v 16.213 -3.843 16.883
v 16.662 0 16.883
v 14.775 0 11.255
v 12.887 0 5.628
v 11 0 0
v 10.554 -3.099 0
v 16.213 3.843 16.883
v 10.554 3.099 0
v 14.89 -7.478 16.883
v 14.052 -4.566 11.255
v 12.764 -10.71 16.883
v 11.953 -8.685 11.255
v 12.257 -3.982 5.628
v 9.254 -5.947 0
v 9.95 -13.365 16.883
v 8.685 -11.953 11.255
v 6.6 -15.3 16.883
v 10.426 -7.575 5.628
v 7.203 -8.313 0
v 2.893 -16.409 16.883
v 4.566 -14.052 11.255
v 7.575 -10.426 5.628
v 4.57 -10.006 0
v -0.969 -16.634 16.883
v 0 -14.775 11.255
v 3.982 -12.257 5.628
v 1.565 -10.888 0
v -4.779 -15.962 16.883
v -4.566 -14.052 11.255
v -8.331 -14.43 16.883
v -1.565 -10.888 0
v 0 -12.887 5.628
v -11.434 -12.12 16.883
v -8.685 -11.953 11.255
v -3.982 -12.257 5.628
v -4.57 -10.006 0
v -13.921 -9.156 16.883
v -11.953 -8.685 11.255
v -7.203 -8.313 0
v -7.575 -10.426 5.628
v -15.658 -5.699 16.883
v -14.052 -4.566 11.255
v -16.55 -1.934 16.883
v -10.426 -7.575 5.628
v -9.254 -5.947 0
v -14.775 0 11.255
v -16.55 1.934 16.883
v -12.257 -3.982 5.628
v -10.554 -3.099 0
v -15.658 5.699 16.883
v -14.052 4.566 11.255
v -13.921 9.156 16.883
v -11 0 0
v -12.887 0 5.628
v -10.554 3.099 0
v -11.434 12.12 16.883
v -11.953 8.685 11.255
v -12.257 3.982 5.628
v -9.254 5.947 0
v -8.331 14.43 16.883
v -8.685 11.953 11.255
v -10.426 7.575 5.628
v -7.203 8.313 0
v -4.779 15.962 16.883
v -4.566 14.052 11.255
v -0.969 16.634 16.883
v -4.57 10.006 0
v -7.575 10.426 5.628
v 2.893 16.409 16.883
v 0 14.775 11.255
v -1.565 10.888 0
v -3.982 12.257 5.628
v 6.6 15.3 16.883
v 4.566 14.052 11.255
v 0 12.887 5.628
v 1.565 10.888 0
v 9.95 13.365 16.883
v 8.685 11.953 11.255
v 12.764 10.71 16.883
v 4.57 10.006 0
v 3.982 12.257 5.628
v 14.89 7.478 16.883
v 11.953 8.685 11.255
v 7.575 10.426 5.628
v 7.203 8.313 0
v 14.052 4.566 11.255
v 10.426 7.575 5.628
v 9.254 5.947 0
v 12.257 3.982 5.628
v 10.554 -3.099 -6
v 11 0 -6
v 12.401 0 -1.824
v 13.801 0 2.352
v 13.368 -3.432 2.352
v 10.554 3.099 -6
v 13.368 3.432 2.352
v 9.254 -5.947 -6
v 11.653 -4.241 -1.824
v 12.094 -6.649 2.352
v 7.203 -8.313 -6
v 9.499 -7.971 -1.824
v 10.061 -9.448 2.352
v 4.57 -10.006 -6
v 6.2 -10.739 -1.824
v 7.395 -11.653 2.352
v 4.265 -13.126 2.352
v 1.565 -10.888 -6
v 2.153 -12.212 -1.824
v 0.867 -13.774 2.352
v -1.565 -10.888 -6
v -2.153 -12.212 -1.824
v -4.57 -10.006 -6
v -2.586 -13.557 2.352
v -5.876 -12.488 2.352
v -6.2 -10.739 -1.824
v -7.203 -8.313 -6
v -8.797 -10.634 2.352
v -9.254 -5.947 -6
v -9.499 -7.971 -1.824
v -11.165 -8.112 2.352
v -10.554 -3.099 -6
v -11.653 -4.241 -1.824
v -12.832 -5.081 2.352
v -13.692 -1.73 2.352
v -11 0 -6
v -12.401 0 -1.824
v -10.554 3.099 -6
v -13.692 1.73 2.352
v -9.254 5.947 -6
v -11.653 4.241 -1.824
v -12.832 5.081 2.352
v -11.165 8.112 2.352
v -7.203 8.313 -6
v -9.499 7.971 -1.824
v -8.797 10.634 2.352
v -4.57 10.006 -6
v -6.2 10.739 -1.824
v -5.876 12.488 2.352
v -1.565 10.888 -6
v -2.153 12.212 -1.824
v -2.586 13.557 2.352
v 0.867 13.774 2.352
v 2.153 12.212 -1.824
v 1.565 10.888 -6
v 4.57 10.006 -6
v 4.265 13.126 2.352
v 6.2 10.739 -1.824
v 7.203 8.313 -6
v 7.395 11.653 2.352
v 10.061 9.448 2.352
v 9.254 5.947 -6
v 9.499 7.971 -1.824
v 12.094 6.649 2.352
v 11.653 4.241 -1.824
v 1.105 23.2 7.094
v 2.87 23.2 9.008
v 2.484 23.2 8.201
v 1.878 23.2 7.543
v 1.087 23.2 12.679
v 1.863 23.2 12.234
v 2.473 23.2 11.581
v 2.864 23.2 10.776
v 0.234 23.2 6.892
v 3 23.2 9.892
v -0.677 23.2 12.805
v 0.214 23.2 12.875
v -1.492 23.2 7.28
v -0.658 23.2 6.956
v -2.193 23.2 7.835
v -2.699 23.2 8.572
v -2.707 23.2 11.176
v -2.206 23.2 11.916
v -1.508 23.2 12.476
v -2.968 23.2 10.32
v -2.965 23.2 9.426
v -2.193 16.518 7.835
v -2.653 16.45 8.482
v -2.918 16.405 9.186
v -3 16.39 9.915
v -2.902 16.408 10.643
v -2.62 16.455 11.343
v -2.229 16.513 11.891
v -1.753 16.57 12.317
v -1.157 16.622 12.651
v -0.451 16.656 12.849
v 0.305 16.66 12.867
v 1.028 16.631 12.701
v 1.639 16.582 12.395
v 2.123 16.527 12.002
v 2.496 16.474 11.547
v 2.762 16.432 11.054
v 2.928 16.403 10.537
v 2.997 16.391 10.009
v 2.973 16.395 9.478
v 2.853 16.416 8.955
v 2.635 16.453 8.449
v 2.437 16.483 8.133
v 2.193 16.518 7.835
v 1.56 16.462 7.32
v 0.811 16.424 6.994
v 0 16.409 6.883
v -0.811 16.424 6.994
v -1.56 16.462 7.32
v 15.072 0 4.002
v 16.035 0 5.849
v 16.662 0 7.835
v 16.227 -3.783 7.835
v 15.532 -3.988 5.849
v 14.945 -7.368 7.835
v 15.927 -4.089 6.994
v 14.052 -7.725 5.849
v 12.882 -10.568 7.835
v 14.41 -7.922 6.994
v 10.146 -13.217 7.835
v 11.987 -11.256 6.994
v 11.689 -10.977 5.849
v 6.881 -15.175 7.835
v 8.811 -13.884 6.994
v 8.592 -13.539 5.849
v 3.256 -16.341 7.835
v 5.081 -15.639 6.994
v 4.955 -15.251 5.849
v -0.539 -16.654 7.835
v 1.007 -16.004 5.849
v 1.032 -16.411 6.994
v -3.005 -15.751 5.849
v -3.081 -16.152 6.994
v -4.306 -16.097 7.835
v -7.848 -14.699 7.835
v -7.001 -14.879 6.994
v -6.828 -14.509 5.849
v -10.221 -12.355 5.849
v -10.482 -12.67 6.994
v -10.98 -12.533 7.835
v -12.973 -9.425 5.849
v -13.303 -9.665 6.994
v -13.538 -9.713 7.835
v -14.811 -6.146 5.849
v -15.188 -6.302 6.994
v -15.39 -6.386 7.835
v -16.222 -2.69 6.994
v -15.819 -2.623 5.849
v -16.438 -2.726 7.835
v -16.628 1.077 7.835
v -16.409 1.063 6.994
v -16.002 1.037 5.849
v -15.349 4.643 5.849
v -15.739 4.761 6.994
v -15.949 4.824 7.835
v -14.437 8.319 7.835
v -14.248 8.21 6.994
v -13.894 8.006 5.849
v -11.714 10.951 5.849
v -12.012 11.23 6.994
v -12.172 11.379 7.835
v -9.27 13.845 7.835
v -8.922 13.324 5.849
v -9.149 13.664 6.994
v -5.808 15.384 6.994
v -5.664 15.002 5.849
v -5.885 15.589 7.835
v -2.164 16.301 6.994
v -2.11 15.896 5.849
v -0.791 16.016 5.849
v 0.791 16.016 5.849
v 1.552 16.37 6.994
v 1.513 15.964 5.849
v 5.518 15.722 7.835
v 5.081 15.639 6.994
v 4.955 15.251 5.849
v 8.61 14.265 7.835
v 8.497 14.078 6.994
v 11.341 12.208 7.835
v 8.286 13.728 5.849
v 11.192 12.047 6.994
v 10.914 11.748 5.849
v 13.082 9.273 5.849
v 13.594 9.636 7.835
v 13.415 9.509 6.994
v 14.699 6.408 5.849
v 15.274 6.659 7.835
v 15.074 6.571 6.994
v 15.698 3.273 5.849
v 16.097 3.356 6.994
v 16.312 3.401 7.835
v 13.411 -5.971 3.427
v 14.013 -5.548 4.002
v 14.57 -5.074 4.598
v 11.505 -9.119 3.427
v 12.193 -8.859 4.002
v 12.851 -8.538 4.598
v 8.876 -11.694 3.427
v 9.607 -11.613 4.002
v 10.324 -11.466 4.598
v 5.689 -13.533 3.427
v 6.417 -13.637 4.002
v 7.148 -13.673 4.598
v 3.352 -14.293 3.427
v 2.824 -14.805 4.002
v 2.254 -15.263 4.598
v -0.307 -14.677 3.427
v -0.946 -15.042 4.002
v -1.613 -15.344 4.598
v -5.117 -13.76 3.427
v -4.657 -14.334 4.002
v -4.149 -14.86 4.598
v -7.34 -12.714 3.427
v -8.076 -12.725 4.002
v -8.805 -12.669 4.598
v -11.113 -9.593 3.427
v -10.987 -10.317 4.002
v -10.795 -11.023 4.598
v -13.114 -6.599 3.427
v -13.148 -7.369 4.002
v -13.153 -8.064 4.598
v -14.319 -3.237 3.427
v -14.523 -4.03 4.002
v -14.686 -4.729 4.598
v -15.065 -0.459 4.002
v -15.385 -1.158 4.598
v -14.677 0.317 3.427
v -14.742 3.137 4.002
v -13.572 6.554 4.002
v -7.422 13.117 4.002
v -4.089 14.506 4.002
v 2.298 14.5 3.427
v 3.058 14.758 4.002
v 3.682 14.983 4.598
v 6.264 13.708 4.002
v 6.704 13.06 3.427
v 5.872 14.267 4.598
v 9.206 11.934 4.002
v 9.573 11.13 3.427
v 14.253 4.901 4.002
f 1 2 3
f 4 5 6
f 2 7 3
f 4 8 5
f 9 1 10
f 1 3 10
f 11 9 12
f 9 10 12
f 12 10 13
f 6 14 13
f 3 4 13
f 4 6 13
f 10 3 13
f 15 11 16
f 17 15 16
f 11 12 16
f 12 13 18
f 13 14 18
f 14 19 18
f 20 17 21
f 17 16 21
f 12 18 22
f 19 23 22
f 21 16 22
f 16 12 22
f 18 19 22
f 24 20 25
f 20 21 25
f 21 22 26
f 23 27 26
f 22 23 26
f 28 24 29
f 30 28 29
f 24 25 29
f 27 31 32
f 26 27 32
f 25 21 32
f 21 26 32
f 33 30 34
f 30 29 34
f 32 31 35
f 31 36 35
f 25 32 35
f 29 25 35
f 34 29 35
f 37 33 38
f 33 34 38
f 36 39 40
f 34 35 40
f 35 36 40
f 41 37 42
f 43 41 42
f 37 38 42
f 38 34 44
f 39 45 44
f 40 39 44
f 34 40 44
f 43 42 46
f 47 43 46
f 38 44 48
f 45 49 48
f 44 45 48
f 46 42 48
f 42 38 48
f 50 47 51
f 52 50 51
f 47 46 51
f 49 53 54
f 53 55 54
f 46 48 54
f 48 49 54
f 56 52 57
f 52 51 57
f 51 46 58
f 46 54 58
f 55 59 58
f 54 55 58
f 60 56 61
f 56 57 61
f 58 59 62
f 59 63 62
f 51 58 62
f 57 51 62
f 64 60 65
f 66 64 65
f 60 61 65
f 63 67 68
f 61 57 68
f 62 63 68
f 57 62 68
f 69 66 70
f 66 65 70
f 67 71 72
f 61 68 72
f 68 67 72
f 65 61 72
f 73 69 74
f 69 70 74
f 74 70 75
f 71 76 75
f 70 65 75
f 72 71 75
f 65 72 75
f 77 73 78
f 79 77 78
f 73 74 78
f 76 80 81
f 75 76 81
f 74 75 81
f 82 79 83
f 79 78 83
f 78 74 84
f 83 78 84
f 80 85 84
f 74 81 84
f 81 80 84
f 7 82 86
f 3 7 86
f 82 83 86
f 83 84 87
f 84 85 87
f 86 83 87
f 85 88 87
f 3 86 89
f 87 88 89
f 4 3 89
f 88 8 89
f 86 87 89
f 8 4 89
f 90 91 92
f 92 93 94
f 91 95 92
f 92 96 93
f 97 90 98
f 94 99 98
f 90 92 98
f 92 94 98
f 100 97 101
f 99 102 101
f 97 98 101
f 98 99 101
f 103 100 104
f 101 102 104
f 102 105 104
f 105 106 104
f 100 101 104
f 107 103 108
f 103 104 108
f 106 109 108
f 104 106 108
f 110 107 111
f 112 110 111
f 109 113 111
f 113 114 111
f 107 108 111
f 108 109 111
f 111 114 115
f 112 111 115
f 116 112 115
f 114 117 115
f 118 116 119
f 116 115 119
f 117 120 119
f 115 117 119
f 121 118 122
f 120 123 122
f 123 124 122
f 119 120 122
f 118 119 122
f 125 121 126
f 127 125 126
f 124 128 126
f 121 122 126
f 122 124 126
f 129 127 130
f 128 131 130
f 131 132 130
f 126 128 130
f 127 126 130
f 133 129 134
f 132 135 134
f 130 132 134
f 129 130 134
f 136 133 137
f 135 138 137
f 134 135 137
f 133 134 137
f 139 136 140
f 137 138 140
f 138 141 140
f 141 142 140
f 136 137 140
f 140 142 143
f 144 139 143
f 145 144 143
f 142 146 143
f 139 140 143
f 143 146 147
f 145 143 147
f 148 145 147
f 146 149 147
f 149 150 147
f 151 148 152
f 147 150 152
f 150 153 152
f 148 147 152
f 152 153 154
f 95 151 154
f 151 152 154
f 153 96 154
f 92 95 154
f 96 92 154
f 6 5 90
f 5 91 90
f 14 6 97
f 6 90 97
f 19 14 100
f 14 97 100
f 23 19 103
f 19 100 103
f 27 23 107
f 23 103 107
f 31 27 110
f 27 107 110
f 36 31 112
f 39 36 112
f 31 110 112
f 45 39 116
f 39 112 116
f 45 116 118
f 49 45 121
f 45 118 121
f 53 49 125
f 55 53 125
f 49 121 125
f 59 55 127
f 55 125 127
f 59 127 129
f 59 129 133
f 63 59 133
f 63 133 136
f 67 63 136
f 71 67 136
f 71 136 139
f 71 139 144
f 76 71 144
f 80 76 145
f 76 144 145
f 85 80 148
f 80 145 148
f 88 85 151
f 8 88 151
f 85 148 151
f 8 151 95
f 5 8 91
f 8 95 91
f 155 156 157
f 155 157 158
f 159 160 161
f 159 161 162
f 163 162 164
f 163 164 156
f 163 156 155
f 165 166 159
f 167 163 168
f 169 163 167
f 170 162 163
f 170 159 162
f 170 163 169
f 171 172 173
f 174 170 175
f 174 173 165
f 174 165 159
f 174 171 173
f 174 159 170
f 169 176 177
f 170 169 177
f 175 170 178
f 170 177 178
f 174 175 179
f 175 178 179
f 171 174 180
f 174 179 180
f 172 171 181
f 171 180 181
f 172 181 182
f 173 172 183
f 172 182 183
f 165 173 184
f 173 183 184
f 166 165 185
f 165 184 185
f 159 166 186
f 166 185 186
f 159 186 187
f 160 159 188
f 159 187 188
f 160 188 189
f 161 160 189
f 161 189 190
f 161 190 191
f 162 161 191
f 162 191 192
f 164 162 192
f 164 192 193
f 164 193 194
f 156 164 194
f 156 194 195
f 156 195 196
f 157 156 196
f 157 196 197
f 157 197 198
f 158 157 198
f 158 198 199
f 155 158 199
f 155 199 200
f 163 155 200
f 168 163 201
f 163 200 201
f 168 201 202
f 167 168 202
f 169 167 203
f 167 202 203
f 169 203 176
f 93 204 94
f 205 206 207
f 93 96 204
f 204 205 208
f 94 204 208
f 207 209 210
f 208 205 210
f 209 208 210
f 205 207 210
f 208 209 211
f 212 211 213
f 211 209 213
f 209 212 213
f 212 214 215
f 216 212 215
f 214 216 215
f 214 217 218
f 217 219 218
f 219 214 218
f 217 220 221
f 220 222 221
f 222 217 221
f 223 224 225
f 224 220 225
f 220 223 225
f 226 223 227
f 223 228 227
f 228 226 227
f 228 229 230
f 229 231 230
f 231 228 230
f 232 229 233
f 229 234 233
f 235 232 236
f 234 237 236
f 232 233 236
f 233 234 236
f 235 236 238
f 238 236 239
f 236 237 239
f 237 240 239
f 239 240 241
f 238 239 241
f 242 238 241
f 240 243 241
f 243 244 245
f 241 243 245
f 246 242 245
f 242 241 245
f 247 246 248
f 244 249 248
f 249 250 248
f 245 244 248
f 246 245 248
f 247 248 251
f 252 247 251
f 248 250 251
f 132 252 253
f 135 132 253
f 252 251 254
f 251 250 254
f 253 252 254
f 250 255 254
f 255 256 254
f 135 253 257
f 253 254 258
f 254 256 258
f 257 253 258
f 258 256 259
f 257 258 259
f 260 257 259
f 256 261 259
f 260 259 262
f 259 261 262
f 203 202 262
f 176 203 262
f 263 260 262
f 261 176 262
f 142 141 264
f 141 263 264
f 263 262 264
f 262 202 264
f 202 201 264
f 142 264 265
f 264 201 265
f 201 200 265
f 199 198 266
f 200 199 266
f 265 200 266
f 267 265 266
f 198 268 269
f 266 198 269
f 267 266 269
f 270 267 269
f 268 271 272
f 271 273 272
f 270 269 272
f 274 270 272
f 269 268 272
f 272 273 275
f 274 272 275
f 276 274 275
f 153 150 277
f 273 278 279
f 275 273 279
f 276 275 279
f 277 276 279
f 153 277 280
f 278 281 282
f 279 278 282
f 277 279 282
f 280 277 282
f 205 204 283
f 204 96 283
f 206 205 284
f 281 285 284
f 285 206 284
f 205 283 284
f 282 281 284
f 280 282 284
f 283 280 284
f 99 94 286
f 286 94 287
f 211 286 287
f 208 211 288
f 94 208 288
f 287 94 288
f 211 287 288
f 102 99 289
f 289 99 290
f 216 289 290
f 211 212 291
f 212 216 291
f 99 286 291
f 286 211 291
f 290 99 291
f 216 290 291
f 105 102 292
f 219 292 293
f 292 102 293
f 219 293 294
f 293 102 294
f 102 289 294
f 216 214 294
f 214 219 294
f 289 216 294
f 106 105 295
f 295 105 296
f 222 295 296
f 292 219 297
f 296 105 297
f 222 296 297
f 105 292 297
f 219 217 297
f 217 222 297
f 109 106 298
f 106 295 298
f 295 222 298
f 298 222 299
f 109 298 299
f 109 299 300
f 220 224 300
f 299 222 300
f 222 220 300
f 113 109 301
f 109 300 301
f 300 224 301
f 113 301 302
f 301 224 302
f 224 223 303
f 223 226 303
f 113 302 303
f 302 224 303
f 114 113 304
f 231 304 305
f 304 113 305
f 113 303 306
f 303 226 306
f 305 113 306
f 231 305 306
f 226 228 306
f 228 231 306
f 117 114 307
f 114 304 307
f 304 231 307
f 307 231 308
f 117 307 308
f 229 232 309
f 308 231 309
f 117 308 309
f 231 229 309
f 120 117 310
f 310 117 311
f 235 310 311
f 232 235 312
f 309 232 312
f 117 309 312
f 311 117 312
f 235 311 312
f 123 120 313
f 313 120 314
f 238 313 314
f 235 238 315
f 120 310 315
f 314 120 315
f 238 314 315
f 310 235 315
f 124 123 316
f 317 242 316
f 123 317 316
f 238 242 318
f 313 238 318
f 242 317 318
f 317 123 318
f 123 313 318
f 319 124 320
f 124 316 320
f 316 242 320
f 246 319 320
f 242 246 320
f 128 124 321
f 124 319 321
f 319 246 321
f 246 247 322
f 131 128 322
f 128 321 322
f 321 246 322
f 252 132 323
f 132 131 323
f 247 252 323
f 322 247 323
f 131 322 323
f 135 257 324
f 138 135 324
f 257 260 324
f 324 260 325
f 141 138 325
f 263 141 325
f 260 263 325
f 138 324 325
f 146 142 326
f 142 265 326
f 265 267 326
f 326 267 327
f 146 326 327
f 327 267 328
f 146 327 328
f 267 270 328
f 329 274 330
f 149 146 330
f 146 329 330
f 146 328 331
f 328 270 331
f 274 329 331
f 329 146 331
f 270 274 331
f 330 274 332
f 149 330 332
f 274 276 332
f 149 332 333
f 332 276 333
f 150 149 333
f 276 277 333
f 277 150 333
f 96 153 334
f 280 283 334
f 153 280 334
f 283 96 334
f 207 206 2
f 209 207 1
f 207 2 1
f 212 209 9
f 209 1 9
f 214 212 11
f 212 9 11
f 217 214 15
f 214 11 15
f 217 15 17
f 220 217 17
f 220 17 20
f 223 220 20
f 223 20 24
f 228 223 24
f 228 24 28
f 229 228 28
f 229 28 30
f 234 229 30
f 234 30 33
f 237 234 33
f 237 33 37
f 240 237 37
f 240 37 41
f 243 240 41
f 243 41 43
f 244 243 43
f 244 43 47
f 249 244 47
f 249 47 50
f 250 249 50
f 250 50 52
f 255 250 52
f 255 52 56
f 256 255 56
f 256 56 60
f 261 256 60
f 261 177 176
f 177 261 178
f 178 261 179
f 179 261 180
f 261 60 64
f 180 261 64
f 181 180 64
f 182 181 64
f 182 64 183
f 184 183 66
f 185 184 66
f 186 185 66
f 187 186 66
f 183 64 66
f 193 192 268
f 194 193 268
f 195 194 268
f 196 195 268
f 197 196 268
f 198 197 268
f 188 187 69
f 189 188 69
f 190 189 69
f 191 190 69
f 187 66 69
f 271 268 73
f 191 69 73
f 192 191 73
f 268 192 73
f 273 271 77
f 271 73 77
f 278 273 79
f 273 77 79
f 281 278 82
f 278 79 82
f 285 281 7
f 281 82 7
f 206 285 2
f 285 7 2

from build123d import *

# Parameters (mm, degrees)
BOSS_EXTRUDE1_START = 16.2
SKETCH3_R           = 3
BOSS_EXTRUDE1_DEPTH = 7


with BuildPart() as part:
    # Sketch2 → Revolve1 (revolve)
    with BuildSketch(Plane(origin=(0, 0, 0), x_dir=(1, 0, 0), z_dir=(0, 1, 0)), mode=Mode.PRIVATE) as revolve1_sk:
        with BuildLine():
            Line((-11, 0), (-11, 6))
            Line((-11, 6), (-13.801099595, -2.351520775))
            ThreePointArc((-13.801099595, -2.351520775), (-15.59397994, -4.904257833), (-16.66244189, -7.835004407))
            Line((-16.66244189, -7.835004407), (-16.66244189, -16.882656067))
            Line((-16.66244189, -16.882656067), (-11, 0))
        make_face()
    revolve(revolve1_sk.sketch.rotate(Axis((0, 0, 0), (0, 0, -1)), 180), axis=Axis((0, 0, 0), (0, 0, -1)))

    # Sketch3 → Boss-Extrude1 (add)
    with BuildSketch(Plane(origin=(0, 0, 0), x_dir=(1, 0, 0), z_dir=(0, 1, 0)).offset(BOSS_EXTRUDE1_START)):
        with Locations(Location((0, -9.882656067, 0), (0, 0, 136.956724762))):
            Circle(SKETCH3_R)
    extrude(amount=BOSS_EXTRUDE1_DEPTH)


solid = part.part
